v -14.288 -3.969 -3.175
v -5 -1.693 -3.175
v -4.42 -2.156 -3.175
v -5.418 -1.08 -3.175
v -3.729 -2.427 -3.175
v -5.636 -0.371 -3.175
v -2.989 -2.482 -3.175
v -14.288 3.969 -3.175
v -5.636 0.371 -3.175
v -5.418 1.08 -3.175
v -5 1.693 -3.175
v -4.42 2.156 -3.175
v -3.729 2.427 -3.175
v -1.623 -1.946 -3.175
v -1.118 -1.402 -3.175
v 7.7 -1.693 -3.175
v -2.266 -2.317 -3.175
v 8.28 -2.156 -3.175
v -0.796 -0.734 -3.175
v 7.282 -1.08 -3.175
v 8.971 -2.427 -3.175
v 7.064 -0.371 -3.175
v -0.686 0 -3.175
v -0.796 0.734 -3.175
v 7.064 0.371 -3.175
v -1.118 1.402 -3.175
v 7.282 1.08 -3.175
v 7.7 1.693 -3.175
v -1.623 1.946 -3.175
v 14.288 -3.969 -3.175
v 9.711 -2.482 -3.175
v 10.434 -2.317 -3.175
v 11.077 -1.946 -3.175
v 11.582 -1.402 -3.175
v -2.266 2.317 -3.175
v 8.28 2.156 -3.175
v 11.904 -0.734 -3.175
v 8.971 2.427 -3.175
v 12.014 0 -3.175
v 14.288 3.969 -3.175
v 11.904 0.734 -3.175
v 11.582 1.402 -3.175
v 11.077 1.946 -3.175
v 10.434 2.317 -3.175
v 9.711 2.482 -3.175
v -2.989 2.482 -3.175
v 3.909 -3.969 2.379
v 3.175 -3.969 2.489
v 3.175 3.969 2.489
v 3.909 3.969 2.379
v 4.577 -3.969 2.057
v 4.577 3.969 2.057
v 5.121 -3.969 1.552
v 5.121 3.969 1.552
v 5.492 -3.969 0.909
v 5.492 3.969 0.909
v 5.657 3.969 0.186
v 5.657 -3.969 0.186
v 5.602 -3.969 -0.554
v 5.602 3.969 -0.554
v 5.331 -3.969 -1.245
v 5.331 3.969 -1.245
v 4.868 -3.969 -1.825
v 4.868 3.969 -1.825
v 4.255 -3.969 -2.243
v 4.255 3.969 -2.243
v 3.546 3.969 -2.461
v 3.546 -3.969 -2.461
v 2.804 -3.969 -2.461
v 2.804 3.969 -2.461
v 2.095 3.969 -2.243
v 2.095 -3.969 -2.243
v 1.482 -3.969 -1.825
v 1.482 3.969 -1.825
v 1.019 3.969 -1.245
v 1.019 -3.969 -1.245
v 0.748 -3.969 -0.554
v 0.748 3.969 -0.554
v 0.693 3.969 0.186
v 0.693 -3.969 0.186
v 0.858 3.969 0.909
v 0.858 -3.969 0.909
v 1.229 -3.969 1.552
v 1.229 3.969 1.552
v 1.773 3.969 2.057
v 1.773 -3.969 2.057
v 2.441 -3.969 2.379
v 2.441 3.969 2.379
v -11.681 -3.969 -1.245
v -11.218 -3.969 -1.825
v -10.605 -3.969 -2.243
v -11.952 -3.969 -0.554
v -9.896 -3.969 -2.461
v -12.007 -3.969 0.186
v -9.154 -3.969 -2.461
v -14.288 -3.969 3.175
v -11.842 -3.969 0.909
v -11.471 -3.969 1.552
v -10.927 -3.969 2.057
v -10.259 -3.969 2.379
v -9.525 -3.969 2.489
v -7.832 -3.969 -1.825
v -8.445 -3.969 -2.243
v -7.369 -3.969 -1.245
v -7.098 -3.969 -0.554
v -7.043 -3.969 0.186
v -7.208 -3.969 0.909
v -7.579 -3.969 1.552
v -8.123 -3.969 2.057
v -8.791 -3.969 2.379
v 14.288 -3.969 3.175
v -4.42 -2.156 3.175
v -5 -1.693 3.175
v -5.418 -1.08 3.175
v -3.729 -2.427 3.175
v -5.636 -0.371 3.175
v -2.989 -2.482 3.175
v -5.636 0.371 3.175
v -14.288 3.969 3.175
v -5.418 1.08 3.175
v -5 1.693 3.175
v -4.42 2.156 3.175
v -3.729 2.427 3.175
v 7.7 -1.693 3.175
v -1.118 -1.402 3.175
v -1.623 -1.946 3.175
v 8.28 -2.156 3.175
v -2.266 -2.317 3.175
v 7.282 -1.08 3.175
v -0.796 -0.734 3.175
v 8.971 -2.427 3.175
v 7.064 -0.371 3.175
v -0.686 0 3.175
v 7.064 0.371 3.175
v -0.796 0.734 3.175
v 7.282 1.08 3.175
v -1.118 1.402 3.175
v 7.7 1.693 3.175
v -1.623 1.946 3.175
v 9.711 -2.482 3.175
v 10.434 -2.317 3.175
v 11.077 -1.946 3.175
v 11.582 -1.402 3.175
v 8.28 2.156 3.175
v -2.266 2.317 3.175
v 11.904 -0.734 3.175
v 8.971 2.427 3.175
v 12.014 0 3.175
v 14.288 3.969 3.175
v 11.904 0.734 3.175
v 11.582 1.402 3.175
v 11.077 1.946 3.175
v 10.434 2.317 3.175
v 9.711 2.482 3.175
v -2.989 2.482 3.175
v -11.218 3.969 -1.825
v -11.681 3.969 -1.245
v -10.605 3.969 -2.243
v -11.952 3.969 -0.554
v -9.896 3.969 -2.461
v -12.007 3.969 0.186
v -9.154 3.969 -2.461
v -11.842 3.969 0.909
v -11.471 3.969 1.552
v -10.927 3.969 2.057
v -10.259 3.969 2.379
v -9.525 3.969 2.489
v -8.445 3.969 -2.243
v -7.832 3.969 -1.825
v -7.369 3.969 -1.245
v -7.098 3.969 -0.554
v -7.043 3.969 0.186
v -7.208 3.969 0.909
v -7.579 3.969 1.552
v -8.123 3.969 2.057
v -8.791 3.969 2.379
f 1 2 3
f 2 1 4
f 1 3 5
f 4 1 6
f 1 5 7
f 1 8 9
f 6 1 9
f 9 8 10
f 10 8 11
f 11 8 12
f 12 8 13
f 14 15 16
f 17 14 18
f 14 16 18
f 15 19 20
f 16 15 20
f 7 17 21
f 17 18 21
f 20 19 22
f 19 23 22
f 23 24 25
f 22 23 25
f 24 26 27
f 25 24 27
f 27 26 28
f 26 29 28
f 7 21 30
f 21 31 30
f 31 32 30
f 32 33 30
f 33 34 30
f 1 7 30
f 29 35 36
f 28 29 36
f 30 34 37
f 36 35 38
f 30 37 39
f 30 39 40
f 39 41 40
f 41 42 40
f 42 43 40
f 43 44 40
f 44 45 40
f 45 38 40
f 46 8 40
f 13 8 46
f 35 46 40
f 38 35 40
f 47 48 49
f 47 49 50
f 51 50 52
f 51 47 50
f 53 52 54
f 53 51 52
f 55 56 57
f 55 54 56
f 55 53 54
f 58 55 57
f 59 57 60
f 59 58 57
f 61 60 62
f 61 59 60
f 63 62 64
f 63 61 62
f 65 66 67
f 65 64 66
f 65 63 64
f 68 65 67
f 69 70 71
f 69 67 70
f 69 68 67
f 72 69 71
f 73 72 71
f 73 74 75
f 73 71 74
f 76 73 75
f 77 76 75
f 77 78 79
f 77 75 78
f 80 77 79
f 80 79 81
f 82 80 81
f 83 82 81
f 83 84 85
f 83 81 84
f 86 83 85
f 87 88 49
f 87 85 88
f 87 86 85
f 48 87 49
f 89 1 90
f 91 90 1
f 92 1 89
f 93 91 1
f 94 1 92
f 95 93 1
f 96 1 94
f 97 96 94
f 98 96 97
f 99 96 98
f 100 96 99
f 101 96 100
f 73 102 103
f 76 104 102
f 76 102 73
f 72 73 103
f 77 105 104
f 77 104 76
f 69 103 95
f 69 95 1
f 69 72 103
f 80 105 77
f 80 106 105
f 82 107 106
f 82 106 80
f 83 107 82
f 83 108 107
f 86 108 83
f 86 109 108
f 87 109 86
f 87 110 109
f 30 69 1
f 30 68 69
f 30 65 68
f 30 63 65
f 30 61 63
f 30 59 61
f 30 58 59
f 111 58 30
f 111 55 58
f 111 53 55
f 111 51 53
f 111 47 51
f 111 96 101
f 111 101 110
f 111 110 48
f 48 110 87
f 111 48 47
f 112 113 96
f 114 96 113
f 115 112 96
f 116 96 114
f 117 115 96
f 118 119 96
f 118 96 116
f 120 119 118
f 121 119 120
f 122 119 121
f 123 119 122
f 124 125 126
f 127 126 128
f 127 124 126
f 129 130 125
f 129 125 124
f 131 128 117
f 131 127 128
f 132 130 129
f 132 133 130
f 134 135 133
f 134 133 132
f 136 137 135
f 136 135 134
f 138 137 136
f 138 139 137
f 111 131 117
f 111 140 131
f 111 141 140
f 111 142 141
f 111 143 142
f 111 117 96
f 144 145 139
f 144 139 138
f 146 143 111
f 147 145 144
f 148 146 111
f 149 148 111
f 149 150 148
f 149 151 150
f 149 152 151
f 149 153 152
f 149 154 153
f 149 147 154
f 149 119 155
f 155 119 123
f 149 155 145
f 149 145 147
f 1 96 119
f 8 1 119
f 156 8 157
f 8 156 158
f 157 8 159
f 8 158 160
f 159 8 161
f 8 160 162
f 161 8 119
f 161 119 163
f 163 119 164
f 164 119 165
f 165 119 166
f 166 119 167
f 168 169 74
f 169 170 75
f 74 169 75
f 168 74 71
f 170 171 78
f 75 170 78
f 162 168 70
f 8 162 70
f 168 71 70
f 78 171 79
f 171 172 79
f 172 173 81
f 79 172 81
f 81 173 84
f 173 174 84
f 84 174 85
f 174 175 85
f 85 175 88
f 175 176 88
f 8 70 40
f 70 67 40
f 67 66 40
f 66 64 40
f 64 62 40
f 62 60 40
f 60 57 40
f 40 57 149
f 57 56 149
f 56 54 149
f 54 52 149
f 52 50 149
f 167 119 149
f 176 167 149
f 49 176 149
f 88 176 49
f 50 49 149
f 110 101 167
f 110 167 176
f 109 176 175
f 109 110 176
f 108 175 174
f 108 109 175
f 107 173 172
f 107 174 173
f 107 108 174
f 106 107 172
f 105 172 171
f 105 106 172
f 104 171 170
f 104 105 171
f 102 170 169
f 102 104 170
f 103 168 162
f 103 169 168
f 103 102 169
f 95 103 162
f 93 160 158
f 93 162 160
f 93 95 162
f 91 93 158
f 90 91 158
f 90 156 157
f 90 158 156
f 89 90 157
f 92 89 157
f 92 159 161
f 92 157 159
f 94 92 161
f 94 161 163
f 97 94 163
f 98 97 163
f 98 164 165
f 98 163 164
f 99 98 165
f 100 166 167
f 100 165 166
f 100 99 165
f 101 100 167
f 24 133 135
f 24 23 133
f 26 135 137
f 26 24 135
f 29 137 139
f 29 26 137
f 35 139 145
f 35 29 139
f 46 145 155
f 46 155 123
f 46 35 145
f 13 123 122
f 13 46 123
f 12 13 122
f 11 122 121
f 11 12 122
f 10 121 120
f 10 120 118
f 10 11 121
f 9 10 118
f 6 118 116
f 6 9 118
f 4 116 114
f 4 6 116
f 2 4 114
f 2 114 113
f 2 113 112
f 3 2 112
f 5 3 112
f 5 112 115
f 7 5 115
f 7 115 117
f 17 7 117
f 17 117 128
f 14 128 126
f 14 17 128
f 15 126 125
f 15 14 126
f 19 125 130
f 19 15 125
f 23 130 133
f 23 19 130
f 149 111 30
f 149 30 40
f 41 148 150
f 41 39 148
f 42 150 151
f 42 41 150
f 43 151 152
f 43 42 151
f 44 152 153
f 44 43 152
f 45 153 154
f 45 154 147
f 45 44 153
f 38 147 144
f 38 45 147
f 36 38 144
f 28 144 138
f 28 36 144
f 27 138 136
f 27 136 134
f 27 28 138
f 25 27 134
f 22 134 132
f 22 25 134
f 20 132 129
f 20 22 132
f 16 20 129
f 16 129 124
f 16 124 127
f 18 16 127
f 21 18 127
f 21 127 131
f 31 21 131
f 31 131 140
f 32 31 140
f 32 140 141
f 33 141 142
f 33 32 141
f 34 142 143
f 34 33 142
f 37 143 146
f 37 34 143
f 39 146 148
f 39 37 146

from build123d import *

# Parameters (mm, degrees)
SKETCH1_W               = 28.575
SKETCH1_H               = 7.9375
SKETCH1_R               = 2.4892
BOSS_EXTRUDE1_DEPTH     = 3.175
CUT_EXTRUDE1_DEPTH      = 16.164572457
CUT_EXTRUDE1_DEPTH_BACK = 16.164572457
SKETCH2_R               = 2.4892


with BuildPart() as part:
    # Sketch1 → Boss-Extrude1 (new, symmetric)
    with BuildSketch(Plane.XY):
        Rectangle(SKETCH1_W, SKETCH1_H)
        with Locations((-3.175, 0)):
            Circle(SKETCH1_R, mode=Mode.SUBTRACT)
        with Locations((9.525, 0)):
            Circle(SKETCH1_R, mode=Mode.SUBTRACT)
    extrude(amount=BOSS_EXTRUDE1_DEPTH, both=True)

    # Sketch2 → Cut-Extrude1 (cut, two sides: drawn at the far end of the back side and taken through both)
    with BuildSketch(Plane(origin=(0, 0, 0), x_dir=(1, 0, 0), z_dir=(0, 1, 0)).offset(-CUT_EXTRUDE1_DEPTH_BACK)):
        with Locations(Location((3.175, 0, 0), (0, 0, 270))):
            Circle(SKETCH2_R)
        with Locations(Location((-9.525, 0, 0), (0, 0, 270))):
            Circle(SKETCH2_R)
    extrude(amount=CUT_EXTRUDE1_DEPTH + CUT_EXTRUDE1_DEPTH_BACK, mode=Mode.SUBTRACT)


solid = part.part
